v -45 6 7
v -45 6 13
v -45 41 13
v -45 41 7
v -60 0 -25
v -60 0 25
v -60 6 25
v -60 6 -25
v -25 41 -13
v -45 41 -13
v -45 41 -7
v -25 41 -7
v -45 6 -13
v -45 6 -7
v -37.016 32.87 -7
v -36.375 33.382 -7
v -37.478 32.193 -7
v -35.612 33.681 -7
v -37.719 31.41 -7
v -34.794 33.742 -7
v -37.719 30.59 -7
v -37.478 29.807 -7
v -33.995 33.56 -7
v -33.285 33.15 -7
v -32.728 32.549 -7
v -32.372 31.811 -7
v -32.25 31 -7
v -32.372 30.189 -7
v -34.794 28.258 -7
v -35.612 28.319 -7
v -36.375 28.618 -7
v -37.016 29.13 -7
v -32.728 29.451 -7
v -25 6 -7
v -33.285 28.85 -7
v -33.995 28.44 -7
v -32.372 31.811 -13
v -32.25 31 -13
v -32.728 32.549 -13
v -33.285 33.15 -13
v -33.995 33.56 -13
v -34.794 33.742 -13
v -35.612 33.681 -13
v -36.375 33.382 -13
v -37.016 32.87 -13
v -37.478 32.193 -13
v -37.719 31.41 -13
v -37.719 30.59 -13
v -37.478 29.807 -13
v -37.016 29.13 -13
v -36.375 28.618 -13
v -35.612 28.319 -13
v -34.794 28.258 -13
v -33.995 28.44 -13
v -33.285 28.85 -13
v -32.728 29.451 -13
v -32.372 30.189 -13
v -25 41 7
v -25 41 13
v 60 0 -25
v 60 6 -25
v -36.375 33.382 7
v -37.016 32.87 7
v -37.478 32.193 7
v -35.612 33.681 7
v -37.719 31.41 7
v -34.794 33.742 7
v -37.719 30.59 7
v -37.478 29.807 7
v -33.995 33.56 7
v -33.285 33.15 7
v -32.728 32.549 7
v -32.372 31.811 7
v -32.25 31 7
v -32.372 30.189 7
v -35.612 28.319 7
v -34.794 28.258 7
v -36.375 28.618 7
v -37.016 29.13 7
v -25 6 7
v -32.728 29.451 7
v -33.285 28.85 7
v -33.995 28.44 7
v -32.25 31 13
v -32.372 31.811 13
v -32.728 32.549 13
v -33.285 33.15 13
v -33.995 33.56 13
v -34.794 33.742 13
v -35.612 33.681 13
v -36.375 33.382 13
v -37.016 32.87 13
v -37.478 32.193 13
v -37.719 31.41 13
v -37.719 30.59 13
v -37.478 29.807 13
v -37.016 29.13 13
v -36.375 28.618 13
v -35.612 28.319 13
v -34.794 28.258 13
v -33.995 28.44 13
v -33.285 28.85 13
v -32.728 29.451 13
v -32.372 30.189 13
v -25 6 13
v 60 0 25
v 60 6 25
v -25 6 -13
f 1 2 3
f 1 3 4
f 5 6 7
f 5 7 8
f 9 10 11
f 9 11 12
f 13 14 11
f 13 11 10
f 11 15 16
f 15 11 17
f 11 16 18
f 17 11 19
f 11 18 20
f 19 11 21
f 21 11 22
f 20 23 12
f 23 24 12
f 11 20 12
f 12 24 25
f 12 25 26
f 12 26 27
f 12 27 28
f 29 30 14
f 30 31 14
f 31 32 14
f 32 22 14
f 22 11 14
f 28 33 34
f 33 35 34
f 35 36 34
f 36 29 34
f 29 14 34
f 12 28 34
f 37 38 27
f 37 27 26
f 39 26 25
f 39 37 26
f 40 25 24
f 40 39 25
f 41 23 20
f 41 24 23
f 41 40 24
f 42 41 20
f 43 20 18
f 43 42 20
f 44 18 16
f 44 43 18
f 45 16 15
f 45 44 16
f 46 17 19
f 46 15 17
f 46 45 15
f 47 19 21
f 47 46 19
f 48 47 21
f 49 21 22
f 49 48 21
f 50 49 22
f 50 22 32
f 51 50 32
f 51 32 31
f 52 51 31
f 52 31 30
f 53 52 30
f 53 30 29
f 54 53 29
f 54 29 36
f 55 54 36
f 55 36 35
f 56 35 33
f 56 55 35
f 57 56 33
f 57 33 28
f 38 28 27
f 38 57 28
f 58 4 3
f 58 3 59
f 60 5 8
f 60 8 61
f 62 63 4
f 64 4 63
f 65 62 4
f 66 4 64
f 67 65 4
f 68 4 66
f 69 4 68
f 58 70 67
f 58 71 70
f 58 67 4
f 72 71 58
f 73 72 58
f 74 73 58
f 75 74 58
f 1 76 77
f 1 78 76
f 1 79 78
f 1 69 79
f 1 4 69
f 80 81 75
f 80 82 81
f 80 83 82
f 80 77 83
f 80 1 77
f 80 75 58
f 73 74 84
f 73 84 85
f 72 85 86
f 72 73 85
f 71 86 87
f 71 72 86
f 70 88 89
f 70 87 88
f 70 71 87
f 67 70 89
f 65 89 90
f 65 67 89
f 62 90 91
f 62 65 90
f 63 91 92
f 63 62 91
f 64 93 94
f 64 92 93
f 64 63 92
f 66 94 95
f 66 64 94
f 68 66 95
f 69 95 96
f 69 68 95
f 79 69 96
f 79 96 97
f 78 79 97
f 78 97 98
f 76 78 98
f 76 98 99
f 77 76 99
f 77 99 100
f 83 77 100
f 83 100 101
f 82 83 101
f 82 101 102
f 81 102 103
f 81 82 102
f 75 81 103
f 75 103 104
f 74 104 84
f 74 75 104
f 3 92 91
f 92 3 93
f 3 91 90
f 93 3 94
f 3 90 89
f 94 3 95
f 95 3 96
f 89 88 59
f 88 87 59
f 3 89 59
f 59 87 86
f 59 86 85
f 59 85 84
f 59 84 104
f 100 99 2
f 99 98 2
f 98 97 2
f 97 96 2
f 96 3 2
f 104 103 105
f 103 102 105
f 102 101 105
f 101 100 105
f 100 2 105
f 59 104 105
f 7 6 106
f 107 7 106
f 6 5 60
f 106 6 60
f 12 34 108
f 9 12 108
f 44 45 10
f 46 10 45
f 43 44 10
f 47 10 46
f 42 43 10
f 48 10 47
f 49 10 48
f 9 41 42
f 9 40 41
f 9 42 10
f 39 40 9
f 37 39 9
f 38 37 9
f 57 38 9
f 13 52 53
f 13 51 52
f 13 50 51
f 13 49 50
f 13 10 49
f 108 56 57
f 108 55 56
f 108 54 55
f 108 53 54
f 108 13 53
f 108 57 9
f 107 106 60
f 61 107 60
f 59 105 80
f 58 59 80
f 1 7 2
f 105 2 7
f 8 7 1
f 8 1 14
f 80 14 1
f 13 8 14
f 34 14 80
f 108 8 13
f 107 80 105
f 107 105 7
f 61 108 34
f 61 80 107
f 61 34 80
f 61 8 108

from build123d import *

# Parameters (mm, degrees)
SKETCH1_W               = 120
SKETCH1_H               = 50
BOSS_EXTRUDE1_DEPTH     = 6
SKETCH2_W               = 20
SKETCH2_H               = 6
BOSS_EXTRUDE2_DEPTH     = 35
SKETCH3_W               = 20
SKETCH3_H               = 6
BOSS_EXTRUDE3_DEPTH     = 35
CUT_EXTRUDE1_DEPTH      = 83.006097334
CUT_EXTRUDE1_DEPTH_BACK = 83.006097334
SKETCH4_R               = 2.75


with BuildPart() as part:
    # Sketch1 → Boss-Extrude1 (new body)
    with BuildSketch(Plane(origin=(0, 0, 0), x_dir=(1, 0, 0), z_dir=(0, 1, 0))):
        Rectangle(SKETCH1_W, SKETCH1_H)
    extrude(amount=BOSS_EXTRUDE1_DEPTH)

    # Sketch2 → Boss-Extrude2 (add)
    with BuildSketch(Plane(origin=(0, 6, 0), x_dir=(1, 0, 0), z_dir=(0, 1, 0))):
        with Locations((-35, -10)):
            Rectangle(SKETCH2_W, SKETCH2_H)
    extrude(amount=BOSS_EXTRUDE2_DEPTH)

    # Sketch3 → Boss-Extrude3 (add)
    with BuildSketch(Plane(origin=(0, 6, 0), x_dir=(1, 0, 0), z_dir=(0, 1, 0))):
        with Locations((-35, 10)):
            Rectangle(SKETCH3_W, SKETCH3_H)
    extrude(amount=BOSS_EXTRUDE3_DEPTH)

    # Sketch4 → Cut-Extrude1 (cut, two sides: drawn at the far end of the back side and taken through both)
    with BuildSketch(Plane.XY.offset(13).offset(-CUT_EXTRUDE1_DEPTH_BACK)):
        with Locations((-35, 31)):
            Circle(SKETCH4_R)
    extrude(amount=CUT_EXTRUDE1_DEPTH + CUT_EXTRUDE1_DEPTH_BACK, mode=Mode.SUBTRACT)


solid = part.part
